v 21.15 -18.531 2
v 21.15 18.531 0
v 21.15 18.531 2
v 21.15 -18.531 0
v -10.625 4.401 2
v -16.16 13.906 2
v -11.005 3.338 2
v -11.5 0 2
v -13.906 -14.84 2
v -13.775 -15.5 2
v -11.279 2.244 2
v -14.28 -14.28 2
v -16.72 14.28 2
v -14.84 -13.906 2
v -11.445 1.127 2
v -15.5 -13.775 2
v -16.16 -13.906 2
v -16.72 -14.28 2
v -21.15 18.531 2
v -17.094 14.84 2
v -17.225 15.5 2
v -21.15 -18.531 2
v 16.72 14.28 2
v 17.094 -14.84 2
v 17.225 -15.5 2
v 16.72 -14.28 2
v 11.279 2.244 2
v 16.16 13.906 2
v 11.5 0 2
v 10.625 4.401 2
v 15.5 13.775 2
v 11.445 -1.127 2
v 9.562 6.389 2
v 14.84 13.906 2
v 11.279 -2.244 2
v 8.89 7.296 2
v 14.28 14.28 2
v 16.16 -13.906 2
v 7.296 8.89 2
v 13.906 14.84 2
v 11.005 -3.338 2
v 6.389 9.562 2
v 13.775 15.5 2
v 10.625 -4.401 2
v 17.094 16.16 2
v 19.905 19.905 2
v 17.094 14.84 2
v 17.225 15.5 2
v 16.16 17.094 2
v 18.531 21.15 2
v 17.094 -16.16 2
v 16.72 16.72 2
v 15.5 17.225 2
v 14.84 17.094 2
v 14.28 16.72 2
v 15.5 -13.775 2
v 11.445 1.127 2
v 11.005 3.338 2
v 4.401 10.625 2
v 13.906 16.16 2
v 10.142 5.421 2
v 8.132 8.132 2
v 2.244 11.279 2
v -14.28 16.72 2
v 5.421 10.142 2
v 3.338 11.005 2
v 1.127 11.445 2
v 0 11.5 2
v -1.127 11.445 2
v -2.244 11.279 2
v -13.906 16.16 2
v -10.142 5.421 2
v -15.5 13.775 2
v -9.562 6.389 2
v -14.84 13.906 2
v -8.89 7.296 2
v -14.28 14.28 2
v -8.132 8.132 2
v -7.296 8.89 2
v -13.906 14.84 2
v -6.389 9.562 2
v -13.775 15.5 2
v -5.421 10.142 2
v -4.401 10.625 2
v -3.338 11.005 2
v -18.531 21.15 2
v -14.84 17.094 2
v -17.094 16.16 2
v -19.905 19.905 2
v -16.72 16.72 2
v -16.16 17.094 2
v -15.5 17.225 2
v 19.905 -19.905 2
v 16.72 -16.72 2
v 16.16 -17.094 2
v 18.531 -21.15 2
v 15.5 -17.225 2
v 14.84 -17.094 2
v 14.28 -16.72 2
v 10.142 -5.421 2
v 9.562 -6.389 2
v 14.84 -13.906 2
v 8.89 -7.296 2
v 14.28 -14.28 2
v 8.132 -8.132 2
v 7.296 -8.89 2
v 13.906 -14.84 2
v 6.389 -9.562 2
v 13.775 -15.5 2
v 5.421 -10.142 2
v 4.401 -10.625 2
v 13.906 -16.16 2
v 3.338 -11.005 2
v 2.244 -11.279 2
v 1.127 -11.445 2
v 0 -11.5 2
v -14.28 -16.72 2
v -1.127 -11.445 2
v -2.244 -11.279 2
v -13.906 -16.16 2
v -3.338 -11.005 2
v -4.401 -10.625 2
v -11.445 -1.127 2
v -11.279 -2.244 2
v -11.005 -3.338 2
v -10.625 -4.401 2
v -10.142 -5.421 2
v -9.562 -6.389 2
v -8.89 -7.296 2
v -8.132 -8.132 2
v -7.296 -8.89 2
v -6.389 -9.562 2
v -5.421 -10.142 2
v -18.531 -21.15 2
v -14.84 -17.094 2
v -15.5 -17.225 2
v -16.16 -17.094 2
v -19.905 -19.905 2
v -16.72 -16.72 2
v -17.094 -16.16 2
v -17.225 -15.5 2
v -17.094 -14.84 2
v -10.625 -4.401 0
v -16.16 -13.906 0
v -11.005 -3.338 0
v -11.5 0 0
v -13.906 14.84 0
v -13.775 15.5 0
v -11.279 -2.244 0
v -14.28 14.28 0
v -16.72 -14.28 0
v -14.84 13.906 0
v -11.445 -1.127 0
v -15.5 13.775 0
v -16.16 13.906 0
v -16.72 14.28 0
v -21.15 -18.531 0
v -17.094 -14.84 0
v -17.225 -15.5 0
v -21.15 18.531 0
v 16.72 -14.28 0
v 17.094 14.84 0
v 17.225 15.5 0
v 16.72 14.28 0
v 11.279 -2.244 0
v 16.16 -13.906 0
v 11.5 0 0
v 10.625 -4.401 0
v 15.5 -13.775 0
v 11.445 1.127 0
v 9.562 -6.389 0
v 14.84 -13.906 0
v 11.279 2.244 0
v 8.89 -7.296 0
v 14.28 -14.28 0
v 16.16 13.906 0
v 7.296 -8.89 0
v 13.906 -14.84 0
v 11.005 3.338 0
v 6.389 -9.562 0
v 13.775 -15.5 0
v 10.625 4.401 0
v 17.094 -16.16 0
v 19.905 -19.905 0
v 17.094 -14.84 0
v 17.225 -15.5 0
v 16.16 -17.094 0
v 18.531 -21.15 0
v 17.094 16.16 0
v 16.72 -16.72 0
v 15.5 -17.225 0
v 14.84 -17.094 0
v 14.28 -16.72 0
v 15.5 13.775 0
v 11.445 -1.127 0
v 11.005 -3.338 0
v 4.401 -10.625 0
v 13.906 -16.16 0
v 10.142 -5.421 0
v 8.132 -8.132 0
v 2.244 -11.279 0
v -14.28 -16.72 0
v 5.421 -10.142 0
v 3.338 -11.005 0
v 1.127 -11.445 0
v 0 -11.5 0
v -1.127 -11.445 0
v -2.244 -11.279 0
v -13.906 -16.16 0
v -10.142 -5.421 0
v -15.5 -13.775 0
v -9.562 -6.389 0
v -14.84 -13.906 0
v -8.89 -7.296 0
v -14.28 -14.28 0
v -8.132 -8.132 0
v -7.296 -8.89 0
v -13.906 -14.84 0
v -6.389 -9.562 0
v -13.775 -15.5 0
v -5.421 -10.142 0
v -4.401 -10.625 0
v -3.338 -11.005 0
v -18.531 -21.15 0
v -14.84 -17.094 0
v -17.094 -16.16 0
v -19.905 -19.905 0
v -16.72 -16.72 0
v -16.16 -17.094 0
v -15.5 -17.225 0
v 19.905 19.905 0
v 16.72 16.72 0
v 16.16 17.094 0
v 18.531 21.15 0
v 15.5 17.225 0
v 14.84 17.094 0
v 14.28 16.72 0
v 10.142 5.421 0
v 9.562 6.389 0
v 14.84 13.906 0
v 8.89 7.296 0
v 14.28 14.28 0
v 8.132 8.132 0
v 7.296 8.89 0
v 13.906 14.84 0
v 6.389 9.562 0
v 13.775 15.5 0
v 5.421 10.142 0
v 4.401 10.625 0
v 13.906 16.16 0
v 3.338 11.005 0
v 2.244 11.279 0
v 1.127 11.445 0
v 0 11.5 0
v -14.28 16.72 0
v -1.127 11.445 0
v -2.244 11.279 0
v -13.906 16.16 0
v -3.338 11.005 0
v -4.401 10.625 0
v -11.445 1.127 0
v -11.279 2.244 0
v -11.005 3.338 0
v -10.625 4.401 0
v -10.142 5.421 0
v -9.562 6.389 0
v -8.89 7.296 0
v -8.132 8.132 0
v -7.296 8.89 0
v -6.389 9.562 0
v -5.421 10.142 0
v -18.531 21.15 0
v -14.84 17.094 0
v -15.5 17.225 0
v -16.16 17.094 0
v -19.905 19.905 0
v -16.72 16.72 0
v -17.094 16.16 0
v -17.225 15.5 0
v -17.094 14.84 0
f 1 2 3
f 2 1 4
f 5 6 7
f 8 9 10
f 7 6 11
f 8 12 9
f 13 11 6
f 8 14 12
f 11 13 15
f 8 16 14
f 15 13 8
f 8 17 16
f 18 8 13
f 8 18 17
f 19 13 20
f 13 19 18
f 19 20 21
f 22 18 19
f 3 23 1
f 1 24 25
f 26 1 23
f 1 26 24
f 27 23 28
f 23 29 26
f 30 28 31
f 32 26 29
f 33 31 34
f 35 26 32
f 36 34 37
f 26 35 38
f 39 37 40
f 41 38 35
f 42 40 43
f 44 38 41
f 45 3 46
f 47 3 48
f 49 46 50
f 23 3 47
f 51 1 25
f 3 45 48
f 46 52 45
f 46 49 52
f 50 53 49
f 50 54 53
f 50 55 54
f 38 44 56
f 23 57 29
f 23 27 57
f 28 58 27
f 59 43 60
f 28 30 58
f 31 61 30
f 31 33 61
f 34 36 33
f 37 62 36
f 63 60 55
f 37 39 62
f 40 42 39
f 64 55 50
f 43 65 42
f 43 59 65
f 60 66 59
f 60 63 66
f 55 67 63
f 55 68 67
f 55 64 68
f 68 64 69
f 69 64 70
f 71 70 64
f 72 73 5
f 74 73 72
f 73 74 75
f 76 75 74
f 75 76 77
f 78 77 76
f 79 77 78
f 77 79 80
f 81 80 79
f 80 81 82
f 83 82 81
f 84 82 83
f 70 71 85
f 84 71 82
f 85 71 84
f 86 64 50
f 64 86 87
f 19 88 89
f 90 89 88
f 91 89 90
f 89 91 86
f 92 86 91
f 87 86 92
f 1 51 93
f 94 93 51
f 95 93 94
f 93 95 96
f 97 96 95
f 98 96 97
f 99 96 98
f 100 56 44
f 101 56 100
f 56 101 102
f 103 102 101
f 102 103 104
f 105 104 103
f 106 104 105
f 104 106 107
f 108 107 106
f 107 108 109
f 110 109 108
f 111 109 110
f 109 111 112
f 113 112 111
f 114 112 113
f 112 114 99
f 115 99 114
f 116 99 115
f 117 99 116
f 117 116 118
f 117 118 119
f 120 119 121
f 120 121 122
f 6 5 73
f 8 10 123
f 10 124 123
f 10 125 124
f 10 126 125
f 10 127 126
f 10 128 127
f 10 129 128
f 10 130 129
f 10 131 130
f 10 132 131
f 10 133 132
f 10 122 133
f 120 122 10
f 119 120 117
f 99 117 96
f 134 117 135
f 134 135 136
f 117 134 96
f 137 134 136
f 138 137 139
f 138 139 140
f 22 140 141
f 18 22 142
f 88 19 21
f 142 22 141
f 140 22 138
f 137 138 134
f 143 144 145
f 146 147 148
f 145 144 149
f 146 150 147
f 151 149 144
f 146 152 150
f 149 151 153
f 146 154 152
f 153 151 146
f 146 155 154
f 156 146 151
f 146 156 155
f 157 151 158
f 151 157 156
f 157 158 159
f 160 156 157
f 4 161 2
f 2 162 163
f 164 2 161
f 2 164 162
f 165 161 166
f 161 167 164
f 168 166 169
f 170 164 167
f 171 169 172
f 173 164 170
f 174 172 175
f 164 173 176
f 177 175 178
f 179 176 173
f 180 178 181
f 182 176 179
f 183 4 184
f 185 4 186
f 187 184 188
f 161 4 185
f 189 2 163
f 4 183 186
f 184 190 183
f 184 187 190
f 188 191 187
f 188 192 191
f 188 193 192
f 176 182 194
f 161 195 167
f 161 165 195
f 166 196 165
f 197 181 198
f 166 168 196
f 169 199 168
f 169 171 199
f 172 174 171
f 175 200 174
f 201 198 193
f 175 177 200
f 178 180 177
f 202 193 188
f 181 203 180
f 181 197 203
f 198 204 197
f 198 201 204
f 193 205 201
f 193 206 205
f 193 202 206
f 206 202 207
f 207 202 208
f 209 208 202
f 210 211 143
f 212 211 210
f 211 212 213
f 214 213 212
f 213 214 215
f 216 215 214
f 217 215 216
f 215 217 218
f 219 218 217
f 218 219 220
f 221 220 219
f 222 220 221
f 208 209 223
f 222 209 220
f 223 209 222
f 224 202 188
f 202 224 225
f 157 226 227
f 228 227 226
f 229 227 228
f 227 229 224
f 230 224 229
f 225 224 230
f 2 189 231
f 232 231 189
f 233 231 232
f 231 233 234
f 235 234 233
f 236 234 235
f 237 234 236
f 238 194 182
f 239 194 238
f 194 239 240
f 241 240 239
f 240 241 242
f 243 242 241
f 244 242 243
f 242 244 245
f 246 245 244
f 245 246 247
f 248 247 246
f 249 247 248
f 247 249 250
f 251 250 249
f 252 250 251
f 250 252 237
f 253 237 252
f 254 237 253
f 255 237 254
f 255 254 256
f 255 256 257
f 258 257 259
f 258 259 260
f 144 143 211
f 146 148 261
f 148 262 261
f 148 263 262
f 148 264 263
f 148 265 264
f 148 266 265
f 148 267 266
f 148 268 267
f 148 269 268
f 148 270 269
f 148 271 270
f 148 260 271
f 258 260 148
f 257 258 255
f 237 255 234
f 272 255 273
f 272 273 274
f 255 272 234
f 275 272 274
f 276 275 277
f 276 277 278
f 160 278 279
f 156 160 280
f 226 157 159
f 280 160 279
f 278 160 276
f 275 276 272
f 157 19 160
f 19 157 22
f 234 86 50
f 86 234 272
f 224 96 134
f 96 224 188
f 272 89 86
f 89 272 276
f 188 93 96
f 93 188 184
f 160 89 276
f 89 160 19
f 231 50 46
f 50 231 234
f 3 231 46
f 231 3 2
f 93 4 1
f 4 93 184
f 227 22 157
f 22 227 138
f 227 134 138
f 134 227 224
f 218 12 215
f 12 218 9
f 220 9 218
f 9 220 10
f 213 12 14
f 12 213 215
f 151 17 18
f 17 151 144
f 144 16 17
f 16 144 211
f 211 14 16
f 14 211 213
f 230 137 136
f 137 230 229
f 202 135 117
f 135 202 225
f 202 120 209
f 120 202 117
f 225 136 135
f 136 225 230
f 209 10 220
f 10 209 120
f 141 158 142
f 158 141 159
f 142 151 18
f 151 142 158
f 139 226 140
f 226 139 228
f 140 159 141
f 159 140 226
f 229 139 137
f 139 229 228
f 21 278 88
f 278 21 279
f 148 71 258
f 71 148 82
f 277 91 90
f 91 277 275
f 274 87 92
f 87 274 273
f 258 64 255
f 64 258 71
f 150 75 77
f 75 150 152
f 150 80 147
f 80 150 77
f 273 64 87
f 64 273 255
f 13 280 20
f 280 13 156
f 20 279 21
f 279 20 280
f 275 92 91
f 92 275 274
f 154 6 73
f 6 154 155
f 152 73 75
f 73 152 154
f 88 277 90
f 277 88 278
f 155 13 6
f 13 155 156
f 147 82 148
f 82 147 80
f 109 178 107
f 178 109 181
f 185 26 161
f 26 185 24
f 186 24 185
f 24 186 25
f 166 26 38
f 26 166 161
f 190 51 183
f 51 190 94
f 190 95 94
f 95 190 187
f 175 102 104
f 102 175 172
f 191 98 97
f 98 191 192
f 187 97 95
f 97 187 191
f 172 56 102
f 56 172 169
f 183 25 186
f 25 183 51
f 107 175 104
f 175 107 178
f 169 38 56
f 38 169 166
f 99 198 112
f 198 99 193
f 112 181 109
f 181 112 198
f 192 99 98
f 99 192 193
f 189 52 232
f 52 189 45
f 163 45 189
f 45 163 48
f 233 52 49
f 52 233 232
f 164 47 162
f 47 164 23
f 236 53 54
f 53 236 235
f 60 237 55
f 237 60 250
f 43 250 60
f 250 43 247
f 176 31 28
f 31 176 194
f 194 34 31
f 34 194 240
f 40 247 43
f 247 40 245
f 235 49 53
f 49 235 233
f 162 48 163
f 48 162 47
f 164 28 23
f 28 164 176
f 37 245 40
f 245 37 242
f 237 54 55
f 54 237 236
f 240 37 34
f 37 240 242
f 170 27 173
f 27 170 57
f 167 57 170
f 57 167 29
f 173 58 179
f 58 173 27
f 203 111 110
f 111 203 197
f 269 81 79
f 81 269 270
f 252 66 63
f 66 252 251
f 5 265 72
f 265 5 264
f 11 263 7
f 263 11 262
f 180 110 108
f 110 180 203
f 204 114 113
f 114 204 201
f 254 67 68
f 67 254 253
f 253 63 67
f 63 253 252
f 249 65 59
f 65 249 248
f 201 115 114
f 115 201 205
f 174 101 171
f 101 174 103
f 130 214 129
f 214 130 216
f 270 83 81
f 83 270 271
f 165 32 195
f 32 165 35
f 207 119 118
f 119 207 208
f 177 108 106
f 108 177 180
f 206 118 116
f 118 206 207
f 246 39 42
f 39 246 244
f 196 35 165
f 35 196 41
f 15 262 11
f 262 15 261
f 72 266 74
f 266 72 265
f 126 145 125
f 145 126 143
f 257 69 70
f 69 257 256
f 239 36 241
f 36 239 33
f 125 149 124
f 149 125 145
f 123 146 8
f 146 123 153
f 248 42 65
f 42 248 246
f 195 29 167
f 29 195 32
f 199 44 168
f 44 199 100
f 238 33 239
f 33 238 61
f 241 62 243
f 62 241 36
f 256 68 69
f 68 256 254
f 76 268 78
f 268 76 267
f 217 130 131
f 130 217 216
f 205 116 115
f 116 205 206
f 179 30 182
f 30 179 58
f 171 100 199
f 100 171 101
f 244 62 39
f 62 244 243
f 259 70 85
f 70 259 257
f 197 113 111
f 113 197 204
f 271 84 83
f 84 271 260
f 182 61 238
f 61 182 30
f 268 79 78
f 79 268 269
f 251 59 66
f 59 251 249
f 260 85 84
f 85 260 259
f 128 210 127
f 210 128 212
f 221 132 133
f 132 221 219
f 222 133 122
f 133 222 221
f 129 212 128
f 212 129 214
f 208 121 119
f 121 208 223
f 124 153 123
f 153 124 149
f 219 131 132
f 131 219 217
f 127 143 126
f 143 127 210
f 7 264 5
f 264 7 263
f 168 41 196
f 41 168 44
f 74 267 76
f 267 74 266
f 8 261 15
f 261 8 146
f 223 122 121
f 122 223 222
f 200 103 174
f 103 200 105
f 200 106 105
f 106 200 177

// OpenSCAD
// file: bearing.scad
// CoreBeam Laser Engraver
//
// Licence: CC BY-SA 3.0, http://creativecommons.org/licenses/by-sa/3.0/
// Author: Dominik Scholz <schlotzz@schlotzz.com>
// visit: http://www.schlotzz.com
//
// several bearings and holders


// include files
include <common.scad>;



// lm8uu bearing
module bearing_lm8uu(bearings)
{
	bearing_diameter = 15;
	bearing_length = 24 + .1;

	rotate([90, 0, 0])
		difference()
		{
			cylinder(r = bearing_diameter / 2, h = bearing_length * bearings, $fn = 32, center = true);
			cylinder(r = 8 / 2, h = bearing_length * bearings + 2 * epsilon, $fn = 16, center = true);
		}
}

// cutouts for lm8uu linear bearing with zipties
// Author: Dominik Scholz <schlotzz@schlotzz.com>
// original author: Josef Průša <iam@josefprusa.cz> and contributors
module bearing_cutout_lm8uu(bearings = 1)
{
	// dimensions
	bearing_diameter = 15;
	bearing_length = 24 + .1;
	cutter_length = 10 + bearings * bearing_length;
	one_holder_length = 8 + bearing_length;
	holder_length = 8 + bearings * bearing_length;
 
	// main bearing cut
	difference()
	{
		translate([0, 0, 12 + 1.5])
			rotate([90, 0, 0])
				translate([0, 0, -cutter_length / 2])
					cylinder(h = cutter_length, r = bearing_diameter / 2, $fn = 50);

		// bearing retainers
		translate([0, 1 - holder_length / 2, 3 + 1.5])
			cube([24, 6, 8], center = true);
		translate([0, -1 + holder_length / 2, 3 + 1.5])
			cube([24, 6, 8], center = true);
	}
 
	// ziptie cutouts
	for (i = [0 : bearings - 1])
	{
		translate([0, -holder_length / 2, 0])
		{
			translate([0, one_holder_length / 2 + i * 25,0])
			{
				difference()
				{
					union()
					{
						translate([0, 2 - 6, 12])
							rotate([90, 0, 0])
								cylinder(h = 4, r = 12.5, $fn = 50);
						translate([0, 2 + 6, 12])
							rotate([90, 0, 0])
								cylinder(h = 4, r = 12.5, $fn = 50);
  					}
					
					translate([0, 10, 12])
						rotate([90, 0, 0])
							cylinder(h = 24, r = 10, $fn = 50);
				}
			}
		}
	}

	// show bearing
	%translate([0, 0, 13])
		bearing_lm8uu(bearings);
 
}



// cutouts for lm8uu linear bearing
module bearing_cutout_lm8uu_simple(bearings = 1)
{
	// dimensions
	bearing_diameter = 15;
	bearing_length = 24 + .5;
	cutter_length = bearing_length * bearings;
 
	// main bearing cut
	rotate([90, 0, 0])
		cylinder(h = cutter_length, r = bearing_diameter / 2, center = true, $fn = 50);
 
	// show bearing
	%bearing_lm8uu(bearings);
}


// 2x623zz flanged bearing (3x10x4mm) as belt idler pulley
module bearing_623zz_pulley()
{
	// dimensions
	bearing_inner_diameter = 10;
	bearing_outer_diameter = 11.5;
	bearing_inner_height = 3;
	bearing_outer_height = 1;
	bearing_height = bearing_inner_height + bearing_outer_height;
	bearing_hole_diameter = 3;

	difference()
	{
		union()
		{
			// inner cylinder
			cylinder(r = bearing_inner_diameter / 2, h = bearing_height * 2, $fn = 32);
			
			// flanges
			for (z = [0, bearing_height * 2 - bearing_outer_height])
				translate([0, 0, z])
					cylinder(r = bearing_outer_diameter / 2, h = bearing_outer_height, $fn = 32);
		}

		// inner mounting hole
		translate([0, 0, -epsilon])
			cylinder(r = bearing_hole_diameter / 2, h = bearing_height * 2 + epsilon * 2, $fn = 16);
	}

}


// cutout for 623zz bearing pulley including belt path
module bearing_cutout_623zz_pulley()
{
	bearing_outer_diameter = 11.5 + 4.5;
	bearing_inner_height = 3;
	bearing_outer_height = 1;
	bearing_height = bearing_inner_height + bearing_outer_height;
	bearing_hole_diameter = 3;
	screw_length = 16;
	belt_width = 4;
	belt_length = 40;

	union()
	{
		// main body cutout
		translate([0, 0, screw_length - bearing_height * 2])
			cylinder(r = bearing_outer_diameter / 2, h = bearing_height * 2);
		
		// mounting hole for screw
		cylinder(r = m3_radius, h = screw_length, $fn = 16);

		// hexnut retaining hole
		translate([0, 0, -epsilon - 10])
			m3_hexnut_cutout(epsilon + 10);

		// belt path
		translate([bearing_outer_diameter / 2 - belt_width, 0, screw_length - bearing_height * 2])
			cube([belt_width, belt_length, bearing_height * 2]);
		translate([-belt_length, -bearing_outer_diameter / 2, screw_length - bearing_height * 2])
			cube([belt_length, belt_width, bearing_height * 2]);
	}

	// show idler pulleys
	%translate([0, 0, 8])
		bearing_623zz_pulley();

}


// belt path
module belt_path(length = 100)
{
	bearing_inner_height = 3;
	bearing_outer_height = 1;
	bearing_height = bearing_inner_height + bearing_outer_height;
	screw_length = 16;
	belt_width = 4;

	translate([0, -length / 2, screw_length - bearing_height * 2])
		cube([belt_width, length, bearing_height * 2]);
}
// file: stage-y.scad
// CoreBeam Laser Engraver
//
// Licence: CC BY-SA 3.0, http://creativecommons.org/licenses/by-sa/3.0/
// Author: Dominik Scholz <schlotzz@schlotzz.com>
// visit: http://www.schlotzz.com
//
// y stage idler


// include files
include <common.scad>;
include <bearing.scad>;



// y stage
module y_stage()
{
	width = 70;
	height = 58;
	depth = 12;

	difference()
	{
		// main body
		translate([0, 0, depth / 2])
			roundedRectangle([width, height, depth], 3, $fn = 32);

		// lm8uu cutouts
		translate([23, 0, 0])
			bearing_cutout_lm8uu(2);

		// belt path
		translate([4, 0, 0])
			belt_path();

		// idler pulley cutouts
		for (i = [[-17, 90], [17, 0]])
			translate([-11, i[0], 0])
				rotate([0, 0, i[1]])
					bearing_cutout_623zz_pulley(epsilon);

		// smooth rods
		for (y = [-21, 21])
			translate([-width / 2 + 15, y, 6])
				rotate([0, -90, 0])
					cylinder(r = 4, h = 40, $fn = 64);

		// center cutout
		translate([-15.5, 0, depth / 2])
			roundedRectangle([30, 10, depth + 2 * epsilon], 3, $fn = 16);
	}
}
// file: switch.scad
// CoreBeam Laser Engraver
//
// Licence: CC BY-SA 3.0, http://creativecommons.org/licenses/by-sa/3.0/
// Author: Dominik Scholz <schlotzz@schlotzz.com>
// visit: http://www.schlotzz.com
//
// endstop switch


// include files
include <common.scad>;



// endstop switch cutout including holes for screws
module endstop_switch_cutout(cable_space = 0)
{
	width = 19.8;
	height = 10.6;
	depth = 6.4;

	// cut body
	translate([0, cable_space / 2, -depth / 2])
		cube([width, height + cable_space, depth], center = true);

	// mounting holes
	for (x = [-9.5 / 2, 9.5 / 2])
		translate([x, height / 2 - 2.9, -epsilon])
			cylinder(r = 2.35 / 2, h = 3, $fn = 8);

	// show body
	%translate([0, 0, -depth / 2])
		cube([width, height, depth], center = true);
}
// file: common.scad
// CoreBeam Laser Engraver
//
// Licence: CC BY-SA 3.0, http://creativecommons.org/licenses/by-sa/3.0/
// Author: Dominik Scholz <schlotzz@schlotzz.com>
// visit: http://www.schlotzz.com
//
// definitions of common values



// avoid openscad artefacts in preview
epsilon = 0.01;

// increase this if your slicer or printer make holes too tight
extra_radius = 0.1;

// major diameter of metric 3mm thread
m3_major = 2.85;
m3_radius = m3_major / 2 + extra_radius;
m3_wide_radius = m3_major / 2 + extra_radius + 0.2;
m3_small_radius = m3_radius - 0.1;

// diameter of metric 3mm hexnut screw head
m3_head_radius = 3 + extra_radius;

// nema 17 dimensions
nema17_width = 42.3;
nema17_hole_offsets = [
	[-15.5, -15.5, 0],
	[-15.5,  15.5, 0],
	[ 15.5, -15.5, 0],
	[ 15.5,  15.5, 0]
];


// hole for retaining a m3 hexnut
module m3_hexnut_cutout(additional_height = 0)
{
	cylinder(r = 3.15 + 2.5 * extra_radius, h = 2.5 + 3 * extra_radius + additional_height, $fn = 6);
}


// rounded rectangle
module roundedRectangle(size, radius)
{
	cube([size[0], size[1] - radius * 2, size[2]], true);
	cube([size[0] - radius * 2, size[1], size[2]], true);

	for (x = [-size[0] / 2 + radius, size[0] / 2 - radius])
		for (y = [-size[1] / 2 + radius, size[1] / 2 - radius])
			translate([x, y, 0])
				cylinder(size[2], radius, radius, true);
}


// rounded trapezoid
module roundedTrapezoid(size, radius, bottom)
{
	hull()
	{
		// bottom
		for (i = [[-bottom / 2 + radius, radius, 0], [bottom / 2 - radius, radius, 0]])
			translate(i)
				cylinder(r = radius, h = size[2], $fn = 32);

		// top
		for (i = [[-size[0] / 2 + radius, size[1] - radius, 0], [size[0] / 2 - radius, size[1] - radius, 0]])
			translate(i)
				cylinder(r = radius, h = size[2], $fn = 32);


	}

}


// hole for wood screw 4x15, countersunk head
module woodscrew_cutout()
{
	translate([0, 0, -epsilon])
		cylinder(r = 2.0, h = 3 + epsilon * 2, $fn = 16);

	translate([0, 0, 3])
		cylinder(r1 = 2.0, r2 = 4.2, h = 2.25, $fn = 16);

	translate([0, 0, 5.25 - epsilon])
		cylinder(r = 4.2, h = 30, $fn = 16);
}
// main file
// CoreBeam Laser Engraver
//
// Licence: CC BY-SA 3.0, http://creativecommons.org/licenses/by-sa/3.0/
// Author: Dominik Scholz <schlotzz@schlotzz.com>
// visit: http://www.schlotzz.com
//
// bottom idler


// include files
include <common.scad>;
include <switch.scad>;
include <stage-y.scad>;



// y stage
module bottom_stage(has_switch = false)
{
	width = 70;
	height = 58;
	depth = 14;
	motor_offset = 0.5;

	difference()
	{
	
		union()
		{
			// main body
			translate([0, 0, depth / 2])
				roundedRectangle([width, height, depth], 3, $fn = 32);

			// rod enforcement
			translate([23, -height / 2 + 18, 15])
			{
				// rotate cylinder to align with sphere
				rotate([90, 5.62, 0])
					cylinder(r = 7.5, h = 18, $fn = 32);
				sphere(r = 7.5, $fn = 32);
			}

			// nema17 mount
			translate([motor_offset, 7.85, 28 / 2])
				intersection()
				{
					cube([nema17_width, nema17_width, 17], center = true);
					cylinder(r = nema17_width / 2 + 7, 17, $fn = 64);
				}
		}

		// smooth rod mounting hole
		translate([23, -height / 2 + 15, 15])
			rotate([90, 0, 0])
				cylinder(r = 4, h = 15 + 2 * epsilon, $fn = 32);

		// nema17 holes
		translate([motor_offset, 7.85, -epsilon])
		union()
		{
			// mounting holes
			for (i = nema17_hole_offsets)
				translate(i)
				{
					cylinder(r = m3_wide_radius, h = 30, $fn = 16);
					cylinder(r = m3_head_radius, h = 7, $fn = 16);
				}

			// center cutout for pulley
			translate([0, 0, 4])
				%cylinder(r = 9 + 0.5, h = 16, $fn = 64);
			cylinder(r = 11 + 0.5, h = depth + 30, $fn = 64);

			// cutout for belt
			translate([-7.5, -50, 10])
				cube([15, 50, depth + 30]);
		}

		// mounting holes
		translate([width / 2 - 8, height / 2 - 8, 0])
			woodscrew_cutout();
		translate([-width / 2 + 8, height / 2 - 8, 0])
			woodscrew_cutout();
		translate([-width / 2 + 8, -4, 0])
			woodscrew_cutout();
	
		// limit switch
		if (has_switch)
		{
			translate([-width / 2 + 14, -(height - 19.8 / 2) / 2, depth - 6.4 + epsilon])
				rotate([0, 180, 0])
					endstop_switch_cutout(5);
		}

	}

}



// motor shim
module bottom_stage_motor_shim()
{
	depth = 2;

	difference()
	{
	
		intersection()
		{
			translate([0, 0, depth / 2])
				cube([nema17_width, nema17_width, depth], center = true);
			cylinder(r = nema17_width / 2 + 7, h = depth, $fn = 64);
		}

		// nema17 holes
		translate([0, 0, -epsilon])
		union()
		{
			// mounting holes
			for (i = nema17_hole_offsets)
				translate(i)
					cylinder(r = m3_wide_radius, h = 30, $fn = 16);

			// center cutout for pulley
			cylinder(r = 11 + 0.5, h = depth + 2 * epsilon, $fn = 64);

			// cutout for belt
			//translate([-7.5, -50, 0])
			//	cube([15, 50, depth + 2 * epsilon]);
		}
	}
}

bottom_stage_motor_shim();
